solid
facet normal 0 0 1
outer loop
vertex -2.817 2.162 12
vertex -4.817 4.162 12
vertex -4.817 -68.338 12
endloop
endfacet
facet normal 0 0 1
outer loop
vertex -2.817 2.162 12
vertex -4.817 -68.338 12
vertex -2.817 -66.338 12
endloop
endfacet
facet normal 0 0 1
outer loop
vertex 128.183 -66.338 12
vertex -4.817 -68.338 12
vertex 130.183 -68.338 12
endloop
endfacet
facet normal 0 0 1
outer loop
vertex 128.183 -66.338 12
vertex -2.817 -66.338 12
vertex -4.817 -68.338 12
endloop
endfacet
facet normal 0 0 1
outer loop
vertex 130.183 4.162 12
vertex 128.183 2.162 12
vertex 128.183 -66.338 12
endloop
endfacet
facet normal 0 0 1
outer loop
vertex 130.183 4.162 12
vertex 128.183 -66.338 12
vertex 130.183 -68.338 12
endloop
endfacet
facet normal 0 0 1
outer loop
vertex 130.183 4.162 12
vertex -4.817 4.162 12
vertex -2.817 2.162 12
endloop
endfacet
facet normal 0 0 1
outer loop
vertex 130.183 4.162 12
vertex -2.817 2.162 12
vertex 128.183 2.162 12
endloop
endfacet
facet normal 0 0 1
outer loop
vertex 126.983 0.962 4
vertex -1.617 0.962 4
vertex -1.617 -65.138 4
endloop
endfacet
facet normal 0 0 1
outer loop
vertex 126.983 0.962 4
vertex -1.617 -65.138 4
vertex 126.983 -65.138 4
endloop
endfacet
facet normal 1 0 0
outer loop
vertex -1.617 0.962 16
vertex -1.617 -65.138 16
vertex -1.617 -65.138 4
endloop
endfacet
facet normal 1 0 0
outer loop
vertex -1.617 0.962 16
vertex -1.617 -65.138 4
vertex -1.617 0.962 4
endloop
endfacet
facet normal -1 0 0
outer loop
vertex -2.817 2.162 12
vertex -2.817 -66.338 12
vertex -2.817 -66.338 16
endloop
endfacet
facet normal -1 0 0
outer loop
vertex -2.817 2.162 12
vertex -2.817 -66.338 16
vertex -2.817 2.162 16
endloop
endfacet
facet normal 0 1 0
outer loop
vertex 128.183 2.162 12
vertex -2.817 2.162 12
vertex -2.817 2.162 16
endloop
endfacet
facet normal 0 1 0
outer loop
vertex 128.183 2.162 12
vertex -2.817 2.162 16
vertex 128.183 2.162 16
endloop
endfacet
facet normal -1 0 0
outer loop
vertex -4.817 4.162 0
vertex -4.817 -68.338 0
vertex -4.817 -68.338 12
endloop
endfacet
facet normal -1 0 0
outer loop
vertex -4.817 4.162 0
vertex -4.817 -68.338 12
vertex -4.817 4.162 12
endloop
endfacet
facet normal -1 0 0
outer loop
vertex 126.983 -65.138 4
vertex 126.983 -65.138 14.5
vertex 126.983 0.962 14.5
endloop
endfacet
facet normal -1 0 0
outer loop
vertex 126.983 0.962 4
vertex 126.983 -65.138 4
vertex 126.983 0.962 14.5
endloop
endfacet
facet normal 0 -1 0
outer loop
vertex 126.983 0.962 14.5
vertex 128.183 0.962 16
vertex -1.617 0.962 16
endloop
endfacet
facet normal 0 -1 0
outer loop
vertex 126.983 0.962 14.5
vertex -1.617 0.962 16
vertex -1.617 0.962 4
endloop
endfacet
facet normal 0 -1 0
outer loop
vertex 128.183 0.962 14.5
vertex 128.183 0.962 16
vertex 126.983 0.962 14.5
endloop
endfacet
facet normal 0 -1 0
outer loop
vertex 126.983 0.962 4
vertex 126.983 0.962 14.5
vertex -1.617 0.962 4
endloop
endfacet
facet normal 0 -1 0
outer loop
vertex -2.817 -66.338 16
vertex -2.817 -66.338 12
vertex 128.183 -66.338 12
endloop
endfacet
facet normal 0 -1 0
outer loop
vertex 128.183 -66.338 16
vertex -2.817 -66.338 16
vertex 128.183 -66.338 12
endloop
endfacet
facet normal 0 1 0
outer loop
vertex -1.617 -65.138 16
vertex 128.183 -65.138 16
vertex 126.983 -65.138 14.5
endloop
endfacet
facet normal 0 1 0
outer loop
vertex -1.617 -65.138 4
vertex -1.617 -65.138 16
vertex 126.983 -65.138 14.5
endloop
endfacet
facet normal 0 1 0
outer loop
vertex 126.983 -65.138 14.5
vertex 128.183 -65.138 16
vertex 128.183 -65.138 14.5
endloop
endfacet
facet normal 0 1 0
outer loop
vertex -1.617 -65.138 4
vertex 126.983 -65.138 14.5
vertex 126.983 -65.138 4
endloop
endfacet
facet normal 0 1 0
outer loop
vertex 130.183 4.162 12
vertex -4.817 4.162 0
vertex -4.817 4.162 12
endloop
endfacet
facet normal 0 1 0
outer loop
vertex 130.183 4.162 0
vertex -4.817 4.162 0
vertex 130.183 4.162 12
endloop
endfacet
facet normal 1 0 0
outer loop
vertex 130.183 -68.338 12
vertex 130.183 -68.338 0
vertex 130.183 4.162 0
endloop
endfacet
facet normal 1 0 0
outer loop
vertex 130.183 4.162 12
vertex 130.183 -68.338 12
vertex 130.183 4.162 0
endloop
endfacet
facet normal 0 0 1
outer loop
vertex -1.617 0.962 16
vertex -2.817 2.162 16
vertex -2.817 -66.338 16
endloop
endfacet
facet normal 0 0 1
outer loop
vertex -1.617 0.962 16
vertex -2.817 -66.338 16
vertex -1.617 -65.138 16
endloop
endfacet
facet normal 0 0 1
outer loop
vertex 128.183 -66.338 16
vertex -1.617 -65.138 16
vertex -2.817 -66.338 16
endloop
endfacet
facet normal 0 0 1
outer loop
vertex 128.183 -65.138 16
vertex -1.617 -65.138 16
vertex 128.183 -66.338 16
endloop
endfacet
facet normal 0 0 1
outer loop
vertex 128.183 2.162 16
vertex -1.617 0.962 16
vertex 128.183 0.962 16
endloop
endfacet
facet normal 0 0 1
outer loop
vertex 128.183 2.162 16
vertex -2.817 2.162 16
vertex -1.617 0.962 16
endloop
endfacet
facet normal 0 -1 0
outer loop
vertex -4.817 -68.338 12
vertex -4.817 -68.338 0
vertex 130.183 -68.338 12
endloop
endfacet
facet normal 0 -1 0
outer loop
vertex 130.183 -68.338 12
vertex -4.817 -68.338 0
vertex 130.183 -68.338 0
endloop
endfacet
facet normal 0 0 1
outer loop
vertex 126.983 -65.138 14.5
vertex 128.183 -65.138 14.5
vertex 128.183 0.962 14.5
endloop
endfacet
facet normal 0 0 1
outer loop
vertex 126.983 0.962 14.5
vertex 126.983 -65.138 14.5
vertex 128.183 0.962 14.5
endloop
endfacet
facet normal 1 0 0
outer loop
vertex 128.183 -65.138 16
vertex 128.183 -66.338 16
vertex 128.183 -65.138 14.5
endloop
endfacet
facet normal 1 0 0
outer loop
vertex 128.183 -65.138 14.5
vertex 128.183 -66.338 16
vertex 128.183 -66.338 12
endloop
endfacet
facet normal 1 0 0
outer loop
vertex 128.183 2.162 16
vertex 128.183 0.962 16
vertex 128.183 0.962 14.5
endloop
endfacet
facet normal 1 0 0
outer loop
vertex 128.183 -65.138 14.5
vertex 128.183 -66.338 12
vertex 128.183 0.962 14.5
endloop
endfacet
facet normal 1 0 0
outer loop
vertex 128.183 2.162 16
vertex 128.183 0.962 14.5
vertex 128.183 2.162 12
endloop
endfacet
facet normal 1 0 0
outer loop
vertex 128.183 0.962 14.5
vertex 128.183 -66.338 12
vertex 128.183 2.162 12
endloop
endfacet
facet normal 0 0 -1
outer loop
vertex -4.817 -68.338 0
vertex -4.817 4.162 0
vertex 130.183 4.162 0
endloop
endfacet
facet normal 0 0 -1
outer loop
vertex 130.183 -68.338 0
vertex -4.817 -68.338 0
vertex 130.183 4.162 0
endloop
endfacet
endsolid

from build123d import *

# Parameters (mm, degrees)
SKETCH1_W           = 135
SKETCH1_H           = 72.5
BOSS_EXTRUDE1_DEPTH = 12
SKETCH2_W           = 131
SKETCH2_H           = 68.5
BOSS_EXTRUDE2_DEPTH = 4
SKETCH4_W           = 128.6
SKETCH4_H           = 66.1
CUT_EXTRUDE1_DEPTH  = 4
SKETCH5_W           = 128.6
SKETCH5_H           = 66.1
CUT_EXTRUDE2_DEPTH  = 8
SKETCH6_W           = 1.5
SKETCH6_H           = 66.1
CUT_EXTRUDE3_DEPTH  = 10


with BuildPart() as part:
    # Sketch1 → Boss-Extrude1 (new body)
    with BuildSketch(Plane.XY):
        with Locations((62.683098592, -32.088028169)):
            Rectangle(SKETCH1_W, SKETCH1_H)
    extrude(amount=BOSS_EXTRUDE1_DEPTH)

    # Sketch2 → Boss-Extrude2 (add)
    with BuildSketch(Plane.XY.offset(12)):
        with Locations((62.683098592, -32.088028169)):
            Rectangle(SKETCH2_W, SKETCH2_H)
    extrude(amount=BOSS_EXTRUDE2_DEPTH)

    # Sketch4 → Cut-Extrude1 (cut)
    with BuildSketch(Plane.XY.offset(16)):
        with Locations((62.683098592, -32.088028169)):
            Rectangle(SKETCH4_W, SKETCH4_H)
    extrude(amount=-CUT_EXTRUDE1_DEPTH, mode=Mode.SUBTRACT)

    # Sketch5 → Cut-Extrude2 (cut)
    with BuildSketch(Plane.XY.offset(12)):
        with Locations((62.683098592, -32.088028169)):
            Rectangle(SKETCH5_W, SKETCH5_H)
    extrude(amount=-CUT_EXTRUDE2_DEPTH, mode=Mode.SUBTRACT)

    # Sketch6 → Cut-Extrude3 (cut)
    with BuildSketch(Plane(origin=(128.183098592, 0, 0), x_dir=(0, 0, -1), z_dir=(1, 0, 0))):
        with Locations((-15.25, -32.088028169)):
            Rectangle(SKETCH6_W, SKETCH6_H)
    extrude(amount=-CUT_EXTRUDE3_DEPTH, mode=Mode.SUBTRACT)


solid = part.part
